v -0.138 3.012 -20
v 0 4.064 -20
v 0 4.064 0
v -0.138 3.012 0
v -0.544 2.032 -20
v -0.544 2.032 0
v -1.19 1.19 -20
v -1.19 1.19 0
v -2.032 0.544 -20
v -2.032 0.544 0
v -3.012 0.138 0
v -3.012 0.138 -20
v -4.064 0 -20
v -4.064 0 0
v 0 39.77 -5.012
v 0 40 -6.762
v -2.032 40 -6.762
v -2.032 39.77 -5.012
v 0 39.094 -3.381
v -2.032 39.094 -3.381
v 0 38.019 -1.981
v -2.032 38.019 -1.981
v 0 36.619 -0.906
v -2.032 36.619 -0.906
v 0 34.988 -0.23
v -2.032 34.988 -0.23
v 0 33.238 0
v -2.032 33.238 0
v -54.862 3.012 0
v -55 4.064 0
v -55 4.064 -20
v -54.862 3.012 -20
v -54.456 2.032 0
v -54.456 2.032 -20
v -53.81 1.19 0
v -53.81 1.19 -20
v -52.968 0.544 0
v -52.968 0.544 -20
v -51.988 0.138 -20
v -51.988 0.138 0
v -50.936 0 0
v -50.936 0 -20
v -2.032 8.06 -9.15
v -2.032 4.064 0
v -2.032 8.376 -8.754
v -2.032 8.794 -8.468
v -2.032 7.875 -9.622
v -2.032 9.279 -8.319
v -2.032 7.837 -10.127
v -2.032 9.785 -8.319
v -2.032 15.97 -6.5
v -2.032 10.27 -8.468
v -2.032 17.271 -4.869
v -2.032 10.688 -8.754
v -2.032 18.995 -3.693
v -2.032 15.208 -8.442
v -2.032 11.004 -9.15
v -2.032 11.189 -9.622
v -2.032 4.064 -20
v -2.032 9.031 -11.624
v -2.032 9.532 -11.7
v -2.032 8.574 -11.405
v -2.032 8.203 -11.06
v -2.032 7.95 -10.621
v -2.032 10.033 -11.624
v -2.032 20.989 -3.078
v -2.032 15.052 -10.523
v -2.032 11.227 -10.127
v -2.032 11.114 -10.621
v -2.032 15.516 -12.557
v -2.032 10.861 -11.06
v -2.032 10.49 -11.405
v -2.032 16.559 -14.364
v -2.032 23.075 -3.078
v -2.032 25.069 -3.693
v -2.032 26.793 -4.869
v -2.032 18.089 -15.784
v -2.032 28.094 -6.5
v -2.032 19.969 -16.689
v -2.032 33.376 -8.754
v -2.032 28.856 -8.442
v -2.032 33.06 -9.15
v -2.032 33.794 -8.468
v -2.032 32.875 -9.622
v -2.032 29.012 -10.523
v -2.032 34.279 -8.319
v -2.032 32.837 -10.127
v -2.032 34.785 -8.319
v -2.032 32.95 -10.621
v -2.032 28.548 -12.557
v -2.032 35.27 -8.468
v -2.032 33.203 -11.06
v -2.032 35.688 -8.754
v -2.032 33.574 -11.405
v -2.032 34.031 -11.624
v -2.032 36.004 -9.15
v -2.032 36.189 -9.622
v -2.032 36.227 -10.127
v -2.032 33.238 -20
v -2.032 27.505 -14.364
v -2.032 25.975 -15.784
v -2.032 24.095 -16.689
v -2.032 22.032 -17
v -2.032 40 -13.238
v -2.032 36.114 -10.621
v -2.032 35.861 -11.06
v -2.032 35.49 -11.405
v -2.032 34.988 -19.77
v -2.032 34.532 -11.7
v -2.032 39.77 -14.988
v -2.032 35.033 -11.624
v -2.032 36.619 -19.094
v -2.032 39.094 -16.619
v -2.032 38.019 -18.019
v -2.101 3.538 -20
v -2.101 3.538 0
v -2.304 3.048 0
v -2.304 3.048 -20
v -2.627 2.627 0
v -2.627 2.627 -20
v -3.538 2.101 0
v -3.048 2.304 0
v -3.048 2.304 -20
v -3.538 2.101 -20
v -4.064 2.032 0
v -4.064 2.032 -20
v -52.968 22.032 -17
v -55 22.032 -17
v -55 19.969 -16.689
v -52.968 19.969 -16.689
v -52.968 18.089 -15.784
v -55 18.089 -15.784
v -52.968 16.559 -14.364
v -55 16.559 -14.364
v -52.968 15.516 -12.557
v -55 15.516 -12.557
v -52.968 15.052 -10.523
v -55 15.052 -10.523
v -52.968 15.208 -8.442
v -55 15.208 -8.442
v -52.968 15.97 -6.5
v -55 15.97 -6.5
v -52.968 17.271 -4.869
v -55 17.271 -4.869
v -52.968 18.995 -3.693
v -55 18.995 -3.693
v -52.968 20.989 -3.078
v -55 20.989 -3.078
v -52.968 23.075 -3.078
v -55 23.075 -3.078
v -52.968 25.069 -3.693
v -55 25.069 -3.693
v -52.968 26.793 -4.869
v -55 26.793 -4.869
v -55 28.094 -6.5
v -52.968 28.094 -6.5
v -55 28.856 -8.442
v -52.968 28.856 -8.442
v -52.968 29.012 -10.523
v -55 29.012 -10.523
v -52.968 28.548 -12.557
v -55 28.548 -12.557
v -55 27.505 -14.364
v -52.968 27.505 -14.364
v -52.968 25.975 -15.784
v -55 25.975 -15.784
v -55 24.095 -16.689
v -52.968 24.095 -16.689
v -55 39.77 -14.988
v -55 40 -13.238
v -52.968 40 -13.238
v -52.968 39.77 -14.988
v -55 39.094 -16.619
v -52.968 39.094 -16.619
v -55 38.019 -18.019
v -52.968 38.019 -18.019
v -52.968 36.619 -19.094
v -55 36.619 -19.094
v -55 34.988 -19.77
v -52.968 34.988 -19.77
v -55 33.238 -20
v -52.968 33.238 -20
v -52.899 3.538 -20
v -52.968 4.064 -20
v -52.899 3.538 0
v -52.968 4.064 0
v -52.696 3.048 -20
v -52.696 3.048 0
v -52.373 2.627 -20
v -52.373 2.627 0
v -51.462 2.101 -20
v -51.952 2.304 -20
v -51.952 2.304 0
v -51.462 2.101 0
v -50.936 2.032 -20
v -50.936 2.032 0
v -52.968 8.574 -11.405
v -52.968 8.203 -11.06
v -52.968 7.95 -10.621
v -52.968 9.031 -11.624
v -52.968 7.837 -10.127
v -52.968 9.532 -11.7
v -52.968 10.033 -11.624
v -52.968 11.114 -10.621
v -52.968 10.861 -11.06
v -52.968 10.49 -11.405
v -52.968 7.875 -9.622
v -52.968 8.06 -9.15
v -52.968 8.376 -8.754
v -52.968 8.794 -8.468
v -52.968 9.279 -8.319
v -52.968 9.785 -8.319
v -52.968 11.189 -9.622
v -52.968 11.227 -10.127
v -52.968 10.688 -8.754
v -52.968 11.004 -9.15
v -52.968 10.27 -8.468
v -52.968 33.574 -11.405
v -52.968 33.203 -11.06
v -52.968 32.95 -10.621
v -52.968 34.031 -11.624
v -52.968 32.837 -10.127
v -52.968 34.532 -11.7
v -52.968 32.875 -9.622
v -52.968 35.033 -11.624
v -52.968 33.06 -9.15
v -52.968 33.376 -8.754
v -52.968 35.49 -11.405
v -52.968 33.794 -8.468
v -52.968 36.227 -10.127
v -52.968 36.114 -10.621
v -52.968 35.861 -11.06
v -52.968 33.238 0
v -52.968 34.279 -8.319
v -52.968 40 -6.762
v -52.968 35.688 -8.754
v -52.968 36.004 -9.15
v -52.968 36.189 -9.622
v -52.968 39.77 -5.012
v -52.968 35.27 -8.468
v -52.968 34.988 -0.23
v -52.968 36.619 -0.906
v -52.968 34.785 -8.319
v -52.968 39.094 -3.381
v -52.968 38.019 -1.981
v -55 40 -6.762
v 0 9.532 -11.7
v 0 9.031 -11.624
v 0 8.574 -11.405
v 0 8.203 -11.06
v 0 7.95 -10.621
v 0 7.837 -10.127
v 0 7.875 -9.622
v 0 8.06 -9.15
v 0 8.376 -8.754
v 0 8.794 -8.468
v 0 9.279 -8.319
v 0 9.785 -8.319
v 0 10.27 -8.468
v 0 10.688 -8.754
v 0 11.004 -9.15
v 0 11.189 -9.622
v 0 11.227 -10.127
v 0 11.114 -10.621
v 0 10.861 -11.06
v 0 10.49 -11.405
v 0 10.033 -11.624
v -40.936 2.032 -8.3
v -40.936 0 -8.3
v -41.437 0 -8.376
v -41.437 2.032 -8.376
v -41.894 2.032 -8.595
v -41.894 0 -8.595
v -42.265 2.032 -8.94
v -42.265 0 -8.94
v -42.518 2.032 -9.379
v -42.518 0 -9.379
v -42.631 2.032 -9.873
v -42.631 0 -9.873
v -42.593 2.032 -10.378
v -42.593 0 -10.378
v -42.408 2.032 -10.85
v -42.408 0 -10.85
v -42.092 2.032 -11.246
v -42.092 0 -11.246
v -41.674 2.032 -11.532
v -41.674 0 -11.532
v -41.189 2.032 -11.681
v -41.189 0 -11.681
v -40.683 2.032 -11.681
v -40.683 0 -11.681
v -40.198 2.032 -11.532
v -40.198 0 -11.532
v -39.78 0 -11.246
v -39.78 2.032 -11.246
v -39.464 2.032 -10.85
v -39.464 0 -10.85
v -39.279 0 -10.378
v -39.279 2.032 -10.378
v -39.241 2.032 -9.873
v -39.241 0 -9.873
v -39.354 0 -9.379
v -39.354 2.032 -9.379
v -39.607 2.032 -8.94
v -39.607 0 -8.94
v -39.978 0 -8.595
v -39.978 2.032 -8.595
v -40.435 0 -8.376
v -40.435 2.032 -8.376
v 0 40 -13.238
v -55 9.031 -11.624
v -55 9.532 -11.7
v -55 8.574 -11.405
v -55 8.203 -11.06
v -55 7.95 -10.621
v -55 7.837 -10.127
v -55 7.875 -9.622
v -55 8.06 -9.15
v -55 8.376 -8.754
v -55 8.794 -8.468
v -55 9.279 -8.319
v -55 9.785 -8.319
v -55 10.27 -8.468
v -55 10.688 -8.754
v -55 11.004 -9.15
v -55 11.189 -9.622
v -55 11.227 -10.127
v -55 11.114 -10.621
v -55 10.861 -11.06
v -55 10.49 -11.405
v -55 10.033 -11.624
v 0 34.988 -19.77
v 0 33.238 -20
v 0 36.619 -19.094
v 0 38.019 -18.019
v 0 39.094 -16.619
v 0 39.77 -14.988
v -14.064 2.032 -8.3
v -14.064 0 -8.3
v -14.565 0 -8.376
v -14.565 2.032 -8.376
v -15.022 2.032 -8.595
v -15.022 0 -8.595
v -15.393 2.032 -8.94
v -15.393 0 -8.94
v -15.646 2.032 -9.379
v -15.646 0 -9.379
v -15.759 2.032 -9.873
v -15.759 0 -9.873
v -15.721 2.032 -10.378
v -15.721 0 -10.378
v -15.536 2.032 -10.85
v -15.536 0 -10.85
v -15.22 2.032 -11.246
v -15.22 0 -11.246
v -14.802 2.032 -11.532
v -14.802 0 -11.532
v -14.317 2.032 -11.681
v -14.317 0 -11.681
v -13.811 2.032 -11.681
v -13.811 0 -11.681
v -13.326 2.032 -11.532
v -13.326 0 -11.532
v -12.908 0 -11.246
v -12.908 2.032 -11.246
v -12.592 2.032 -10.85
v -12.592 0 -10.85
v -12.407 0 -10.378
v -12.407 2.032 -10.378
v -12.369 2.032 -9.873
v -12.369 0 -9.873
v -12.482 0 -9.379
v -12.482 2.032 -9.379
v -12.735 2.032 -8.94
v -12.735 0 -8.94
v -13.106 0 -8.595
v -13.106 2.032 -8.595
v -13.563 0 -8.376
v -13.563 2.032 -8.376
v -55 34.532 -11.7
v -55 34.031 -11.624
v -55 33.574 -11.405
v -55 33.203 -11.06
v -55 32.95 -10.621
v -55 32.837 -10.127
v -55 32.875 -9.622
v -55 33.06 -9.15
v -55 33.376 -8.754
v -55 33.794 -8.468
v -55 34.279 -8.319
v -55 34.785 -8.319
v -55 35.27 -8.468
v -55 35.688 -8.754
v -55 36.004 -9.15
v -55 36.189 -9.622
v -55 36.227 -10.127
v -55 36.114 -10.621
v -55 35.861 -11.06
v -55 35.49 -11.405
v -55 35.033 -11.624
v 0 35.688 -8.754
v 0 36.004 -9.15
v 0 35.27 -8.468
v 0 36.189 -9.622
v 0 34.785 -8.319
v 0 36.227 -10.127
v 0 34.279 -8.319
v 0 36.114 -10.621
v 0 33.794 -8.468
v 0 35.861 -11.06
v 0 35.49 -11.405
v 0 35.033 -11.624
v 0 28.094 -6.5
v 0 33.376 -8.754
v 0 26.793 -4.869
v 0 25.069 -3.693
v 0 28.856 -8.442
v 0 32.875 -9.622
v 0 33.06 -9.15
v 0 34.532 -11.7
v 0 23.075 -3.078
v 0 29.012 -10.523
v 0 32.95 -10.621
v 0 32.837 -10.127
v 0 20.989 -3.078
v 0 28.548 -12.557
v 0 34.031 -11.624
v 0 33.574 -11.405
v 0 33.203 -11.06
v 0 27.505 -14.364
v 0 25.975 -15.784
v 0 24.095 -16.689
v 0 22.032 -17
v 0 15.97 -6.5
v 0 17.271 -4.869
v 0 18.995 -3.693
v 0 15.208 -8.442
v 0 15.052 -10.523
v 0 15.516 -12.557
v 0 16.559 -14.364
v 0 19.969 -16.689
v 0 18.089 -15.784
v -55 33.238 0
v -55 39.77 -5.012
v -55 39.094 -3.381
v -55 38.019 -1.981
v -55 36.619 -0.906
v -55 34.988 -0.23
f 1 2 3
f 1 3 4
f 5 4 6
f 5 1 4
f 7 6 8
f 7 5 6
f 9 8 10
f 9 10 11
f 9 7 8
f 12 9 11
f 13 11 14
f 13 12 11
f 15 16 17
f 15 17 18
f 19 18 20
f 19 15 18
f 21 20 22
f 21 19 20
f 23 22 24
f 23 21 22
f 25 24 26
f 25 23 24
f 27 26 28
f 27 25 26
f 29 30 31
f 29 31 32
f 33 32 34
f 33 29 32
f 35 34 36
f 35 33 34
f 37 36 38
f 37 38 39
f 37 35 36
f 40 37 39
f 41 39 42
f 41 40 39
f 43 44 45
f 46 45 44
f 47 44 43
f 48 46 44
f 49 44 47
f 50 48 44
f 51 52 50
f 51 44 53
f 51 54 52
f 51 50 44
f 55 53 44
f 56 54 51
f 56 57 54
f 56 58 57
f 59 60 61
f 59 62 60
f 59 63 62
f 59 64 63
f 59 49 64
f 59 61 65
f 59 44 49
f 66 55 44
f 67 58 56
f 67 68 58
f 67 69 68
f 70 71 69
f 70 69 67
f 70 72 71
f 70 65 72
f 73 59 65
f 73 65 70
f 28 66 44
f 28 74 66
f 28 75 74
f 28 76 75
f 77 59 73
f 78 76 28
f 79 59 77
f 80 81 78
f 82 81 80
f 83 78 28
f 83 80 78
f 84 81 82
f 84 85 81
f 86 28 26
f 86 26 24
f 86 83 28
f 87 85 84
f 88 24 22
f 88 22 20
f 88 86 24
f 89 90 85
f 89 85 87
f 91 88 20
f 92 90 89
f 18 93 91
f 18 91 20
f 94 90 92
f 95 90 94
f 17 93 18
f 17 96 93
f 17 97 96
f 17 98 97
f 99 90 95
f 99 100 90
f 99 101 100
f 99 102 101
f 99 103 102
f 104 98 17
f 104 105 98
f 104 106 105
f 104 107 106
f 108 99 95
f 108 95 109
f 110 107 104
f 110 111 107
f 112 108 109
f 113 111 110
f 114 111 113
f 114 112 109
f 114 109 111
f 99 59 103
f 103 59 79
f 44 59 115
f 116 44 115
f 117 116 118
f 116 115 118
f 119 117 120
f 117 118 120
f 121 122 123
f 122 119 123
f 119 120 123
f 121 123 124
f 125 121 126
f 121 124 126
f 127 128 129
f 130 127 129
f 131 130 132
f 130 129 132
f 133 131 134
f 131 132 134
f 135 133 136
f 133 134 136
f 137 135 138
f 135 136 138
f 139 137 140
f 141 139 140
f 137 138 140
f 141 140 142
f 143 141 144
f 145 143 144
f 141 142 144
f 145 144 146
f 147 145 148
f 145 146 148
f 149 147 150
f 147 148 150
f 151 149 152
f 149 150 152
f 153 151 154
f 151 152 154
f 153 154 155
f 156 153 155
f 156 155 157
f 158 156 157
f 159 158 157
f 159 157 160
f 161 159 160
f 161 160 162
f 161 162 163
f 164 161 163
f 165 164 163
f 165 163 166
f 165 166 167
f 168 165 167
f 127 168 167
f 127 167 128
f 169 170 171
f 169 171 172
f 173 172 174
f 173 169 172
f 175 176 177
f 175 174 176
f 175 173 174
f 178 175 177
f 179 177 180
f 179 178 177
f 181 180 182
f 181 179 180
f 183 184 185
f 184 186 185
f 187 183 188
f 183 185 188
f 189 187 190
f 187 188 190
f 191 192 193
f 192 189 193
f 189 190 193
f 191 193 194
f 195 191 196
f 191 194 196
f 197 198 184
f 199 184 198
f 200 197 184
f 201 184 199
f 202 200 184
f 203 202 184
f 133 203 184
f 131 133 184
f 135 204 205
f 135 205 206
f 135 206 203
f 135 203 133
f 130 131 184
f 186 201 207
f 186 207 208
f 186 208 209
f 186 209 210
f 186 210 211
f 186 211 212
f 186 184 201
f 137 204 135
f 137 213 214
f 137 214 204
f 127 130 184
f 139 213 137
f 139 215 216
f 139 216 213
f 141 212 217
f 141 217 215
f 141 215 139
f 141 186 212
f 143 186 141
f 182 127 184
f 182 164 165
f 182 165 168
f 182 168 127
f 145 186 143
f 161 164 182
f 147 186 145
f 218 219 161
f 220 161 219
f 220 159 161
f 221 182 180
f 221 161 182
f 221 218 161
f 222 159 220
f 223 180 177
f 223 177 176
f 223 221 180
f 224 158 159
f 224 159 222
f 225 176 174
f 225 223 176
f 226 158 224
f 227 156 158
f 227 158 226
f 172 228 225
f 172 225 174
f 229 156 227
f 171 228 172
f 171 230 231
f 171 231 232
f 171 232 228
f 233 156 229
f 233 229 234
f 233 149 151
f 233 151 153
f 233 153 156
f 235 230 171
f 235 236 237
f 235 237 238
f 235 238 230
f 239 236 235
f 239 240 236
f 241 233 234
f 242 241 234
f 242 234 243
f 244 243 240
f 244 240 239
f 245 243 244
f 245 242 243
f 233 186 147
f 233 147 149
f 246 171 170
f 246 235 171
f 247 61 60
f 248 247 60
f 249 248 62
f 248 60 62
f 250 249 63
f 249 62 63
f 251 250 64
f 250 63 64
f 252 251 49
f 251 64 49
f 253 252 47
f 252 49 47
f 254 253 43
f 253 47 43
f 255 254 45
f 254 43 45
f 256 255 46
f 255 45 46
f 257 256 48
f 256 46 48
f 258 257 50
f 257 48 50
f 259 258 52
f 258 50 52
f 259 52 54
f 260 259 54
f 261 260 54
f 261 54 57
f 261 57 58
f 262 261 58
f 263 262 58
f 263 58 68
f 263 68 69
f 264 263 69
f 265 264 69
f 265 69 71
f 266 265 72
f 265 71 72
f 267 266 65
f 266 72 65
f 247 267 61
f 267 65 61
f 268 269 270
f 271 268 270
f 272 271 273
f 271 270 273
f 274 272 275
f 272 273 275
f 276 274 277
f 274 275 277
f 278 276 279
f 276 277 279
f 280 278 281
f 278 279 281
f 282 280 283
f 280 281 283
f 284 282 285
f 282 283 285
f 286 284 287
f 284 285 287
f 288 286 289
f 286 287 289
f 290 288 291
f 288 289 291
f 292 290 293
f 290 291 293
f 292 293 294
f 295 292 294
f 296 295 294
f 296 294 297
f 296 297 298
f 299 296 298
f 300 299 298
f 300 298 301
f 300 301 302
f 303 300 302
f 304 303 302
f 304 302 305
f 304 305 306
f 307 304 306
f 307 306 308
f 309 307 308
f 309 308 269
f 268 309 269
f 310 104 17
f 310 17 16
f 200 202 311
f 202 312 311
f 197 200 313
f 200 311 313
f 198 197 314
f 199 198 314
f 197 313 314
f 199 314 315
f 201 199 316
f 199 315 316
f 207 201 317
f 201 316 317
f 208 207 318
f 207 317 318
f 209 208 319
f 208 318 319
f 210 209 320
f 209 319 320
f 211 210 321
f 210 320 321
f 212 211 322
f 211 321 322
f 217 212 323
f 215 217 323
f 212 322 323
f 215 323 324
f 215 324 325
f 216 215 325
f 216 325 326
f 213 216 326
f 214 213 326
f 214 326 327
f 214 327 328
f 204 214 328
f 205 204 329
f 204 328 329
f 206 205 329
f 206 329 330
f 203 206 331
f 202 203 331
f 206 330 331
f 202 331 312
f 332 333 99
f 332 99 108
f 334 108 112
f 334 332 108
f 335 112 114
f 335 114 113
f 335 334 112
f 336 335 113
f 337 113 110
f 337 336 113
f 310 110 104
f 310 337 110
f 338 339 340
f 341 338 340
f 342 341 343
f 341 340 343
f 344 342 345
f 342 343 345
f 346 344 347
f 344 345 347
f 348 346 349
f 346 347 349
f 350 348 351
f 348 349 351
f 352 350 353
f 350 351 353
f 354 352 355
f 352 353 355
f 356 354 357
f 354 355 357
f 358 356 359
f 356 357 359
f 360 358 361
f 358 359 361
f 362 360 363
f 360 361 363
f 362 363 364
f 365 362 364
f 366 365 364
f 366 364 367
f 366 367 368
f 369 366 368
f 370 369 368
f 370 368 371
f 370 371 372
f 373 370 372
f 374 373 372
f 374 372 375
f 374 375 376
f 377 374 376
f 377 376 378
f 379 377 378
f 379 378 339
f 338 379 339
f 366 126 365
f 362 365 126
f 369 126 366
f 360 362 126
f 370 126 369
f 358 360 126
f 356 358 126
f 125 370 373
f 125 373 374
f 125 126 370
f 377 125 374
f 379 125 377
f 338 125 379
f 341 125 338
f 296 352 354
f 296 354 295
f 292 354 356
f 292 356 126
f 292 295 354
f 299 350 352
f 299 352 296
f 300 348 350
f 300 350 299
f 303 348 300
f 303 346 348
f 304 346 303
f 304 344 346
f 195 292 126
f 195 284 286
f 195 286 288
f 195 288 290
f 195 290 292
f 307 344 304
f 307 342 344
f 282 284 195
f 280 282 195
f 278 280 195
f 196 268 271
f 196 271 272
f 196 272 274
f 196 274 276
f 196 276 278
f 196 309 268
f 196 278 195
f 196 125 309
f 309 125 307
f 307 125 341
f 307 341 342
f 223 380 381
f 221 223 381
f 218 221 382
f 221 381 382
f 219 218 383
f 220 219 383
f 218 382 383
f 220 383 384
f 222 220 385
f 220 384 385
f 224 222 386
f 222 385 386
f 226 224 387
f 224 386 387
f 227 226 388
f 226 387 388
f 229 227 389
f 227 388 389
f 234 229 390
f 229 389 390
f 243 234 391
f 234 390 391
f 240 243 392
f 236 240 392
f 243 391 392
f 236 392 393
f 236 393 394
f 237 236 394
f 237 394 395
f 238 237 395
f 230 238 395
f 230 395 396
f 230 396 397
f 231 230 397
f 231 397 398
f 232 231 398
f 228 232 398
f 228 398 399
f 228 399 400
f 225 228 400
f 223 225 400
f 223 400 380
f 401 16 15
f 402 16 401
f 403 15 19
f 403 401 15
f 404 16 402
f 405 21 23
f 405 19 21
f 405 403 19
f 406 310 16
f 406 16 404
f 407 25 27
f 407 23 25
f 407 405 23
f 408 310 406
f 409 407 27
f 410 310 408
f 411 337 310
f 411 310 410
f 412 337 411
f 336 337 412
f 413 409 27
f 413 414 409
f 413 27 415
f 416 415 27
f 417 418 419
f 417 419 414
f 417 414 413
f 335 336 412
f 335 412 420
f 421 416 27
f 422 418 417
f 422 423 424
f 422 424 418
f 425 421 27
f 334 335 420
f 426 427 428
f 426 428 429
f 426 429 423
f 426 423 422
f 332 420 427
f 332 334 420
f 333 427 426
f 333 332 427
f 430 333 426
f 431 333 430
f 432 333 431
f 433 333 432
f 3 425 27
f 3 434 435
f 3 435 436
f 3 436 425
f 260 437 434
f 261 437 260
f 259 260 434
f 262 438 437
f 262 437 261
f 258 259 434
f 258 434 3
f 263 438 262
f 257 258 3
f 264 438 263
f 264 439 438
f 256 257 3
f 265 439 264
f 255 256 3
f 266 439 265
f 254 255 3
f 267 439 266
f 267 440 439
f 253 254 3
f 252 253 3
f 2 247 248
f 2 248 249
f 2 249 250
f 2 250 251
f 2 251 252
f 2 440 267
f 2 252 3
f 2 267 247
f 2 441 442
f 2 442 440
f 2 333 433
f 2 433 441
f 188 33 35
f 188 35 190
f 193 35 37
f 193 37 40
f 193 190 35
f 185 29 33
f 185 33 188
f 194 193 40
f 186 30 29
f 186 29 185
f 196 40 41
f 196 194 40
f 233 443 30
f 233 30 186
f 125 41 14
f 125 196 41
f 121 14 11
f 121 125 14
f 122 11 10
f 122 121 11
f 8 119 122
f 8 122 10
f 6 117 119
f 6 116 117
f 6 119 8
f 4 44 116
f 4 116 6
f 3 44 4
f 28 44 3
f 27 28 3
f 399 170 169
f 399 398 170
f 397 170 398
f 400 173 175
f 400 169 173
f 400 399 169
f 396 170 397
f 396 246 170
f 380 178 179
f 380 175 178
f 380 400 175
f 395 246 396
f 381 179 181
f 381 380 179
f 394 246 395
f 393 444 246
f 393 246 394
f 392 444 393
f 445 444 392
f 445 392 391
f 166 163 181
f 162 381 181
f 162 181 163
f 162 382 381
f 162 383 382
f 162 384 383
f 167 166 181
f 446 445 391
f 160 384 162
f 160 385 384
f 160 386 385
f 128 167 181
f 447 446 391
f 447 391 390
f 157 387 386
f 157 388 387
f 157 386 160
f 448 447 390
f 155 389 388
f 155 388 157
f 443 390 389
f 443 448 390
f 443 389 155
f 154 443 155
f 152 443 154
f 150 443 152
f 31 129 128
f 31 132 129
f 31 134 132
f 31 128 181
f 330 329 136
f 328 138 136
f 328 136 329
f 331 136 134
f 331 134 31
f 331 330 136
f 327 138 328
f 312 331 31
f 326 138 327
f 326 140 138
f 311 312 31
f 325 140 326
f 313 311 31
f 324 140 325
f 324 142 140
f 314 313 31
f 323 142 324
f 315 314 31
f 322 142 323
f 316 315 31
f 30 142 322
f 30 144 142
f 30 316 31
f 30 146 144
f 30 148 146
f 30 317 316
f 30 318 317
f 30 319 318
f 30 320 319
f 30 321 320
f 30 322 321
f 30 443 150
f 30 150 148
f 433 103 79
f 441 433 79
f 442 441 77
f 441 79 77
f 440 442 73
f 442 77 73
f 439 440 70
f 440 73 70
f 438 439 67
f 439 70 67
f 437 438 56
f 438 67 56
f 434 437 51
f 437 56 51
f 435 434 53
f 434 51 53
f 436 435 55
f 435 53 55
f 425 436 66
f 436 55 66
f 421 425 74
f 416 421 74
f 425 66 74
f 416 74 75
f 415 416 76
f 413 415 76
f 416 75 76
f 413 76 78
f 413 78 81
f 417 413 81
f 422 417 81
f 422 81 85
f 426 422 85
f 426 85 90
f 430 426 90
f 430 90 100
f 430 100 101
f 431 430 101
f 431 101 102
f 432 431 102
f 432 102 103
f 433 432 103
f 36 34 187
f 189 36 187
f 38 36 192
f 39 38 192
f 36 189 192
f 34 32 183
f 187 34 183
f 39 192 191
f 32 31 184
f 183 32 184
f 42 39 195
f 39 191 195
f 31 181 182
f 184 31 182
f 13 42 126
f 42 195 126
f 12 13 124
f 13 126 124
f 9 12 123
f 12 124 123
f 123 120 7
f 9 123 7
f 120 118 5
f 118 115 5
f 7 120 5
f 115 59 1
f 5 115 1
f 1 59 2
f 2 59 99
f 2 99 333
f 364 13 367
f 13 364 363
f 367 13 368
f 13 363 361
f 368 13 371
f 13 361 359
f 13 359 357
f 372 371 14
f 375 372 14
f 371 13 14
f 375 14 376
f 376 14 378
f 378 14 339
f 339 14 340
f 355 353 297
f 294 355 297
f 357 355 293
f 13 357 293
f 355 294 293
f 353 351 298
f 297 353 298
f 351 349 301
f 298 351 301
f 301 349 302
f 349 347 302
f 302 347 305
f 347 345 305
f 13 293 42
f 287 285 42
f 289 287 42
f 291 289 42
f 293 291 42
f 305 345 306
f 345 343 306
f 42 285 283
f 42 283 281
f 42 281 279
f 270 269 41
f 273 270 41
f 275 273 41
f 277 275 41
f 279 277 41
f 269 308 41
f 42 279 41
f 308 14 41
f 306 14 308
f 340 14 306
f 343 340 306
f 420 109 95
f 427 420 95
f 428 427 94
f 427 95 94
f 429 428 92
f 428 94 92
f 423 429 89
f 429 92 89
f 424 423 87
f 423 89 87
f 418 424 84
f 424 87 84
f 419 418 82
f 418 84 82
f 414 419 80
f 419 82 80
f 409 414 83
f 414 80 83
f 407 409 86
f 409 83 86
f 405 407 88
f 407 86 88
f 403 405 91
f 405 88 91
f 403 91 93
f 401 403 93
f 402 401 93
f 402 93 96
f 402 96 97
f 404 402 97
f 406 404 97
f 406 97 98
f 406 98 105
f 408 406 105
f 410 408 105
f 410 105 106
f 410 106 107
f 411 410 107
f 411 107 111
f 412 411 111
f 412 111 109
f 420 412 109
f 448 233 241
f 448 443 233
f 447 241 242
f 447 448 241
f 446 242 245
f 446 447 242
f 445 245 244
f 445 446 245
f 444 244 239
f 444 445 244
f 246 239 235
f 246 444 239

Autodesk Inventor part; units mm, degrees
ref_plane "YZ Plane" through (0, 0, 0) normal (1, 0, 0) x (0, 1, 0)
ref_plane "XZ Plane" through (0, 0, 0) normal (0, 1, 0) x (-1, 0, 0)
ref_plane "XY Plane" through (0, 0, 0) normal (0, 0, 1) x (1, 0, 0)
sketch "Sketch3" plane through (0, 0, 0) normal (0, 1, 0) x (-1, 0, 0)
  line L0 (55, 0) -> (0, 0)
  line L1 (0, 0) -> (0, -20)
  line L2 (0, -20) -> (55, -20)
  line L3 (55, -20) -> (55, 0)
  dimension "d9" = 55
  dimension "d10" = 20
extrude "Plate1" add sketch "Sketch3" along normal blind 2.032
sketch "Sketch4" plane through (-52.968, 0, 0) normal (-1, 0, 0) x (0, -1, 0)
  line L0 (0, -20) -> (0, 0)
  line L1 (0, 0) -> (-40, 0)
  line L2 (-40, 0) -> (-40, -20)
  line L3 (-40, -20) -> (0, -20)
edge flange "Flange1" height 40 angle 90 thickness 2.032 bend radius 2.032 thickness toward (-1, 0, 0) relief tear relief width 2.032 relief depth 1.016 corner gap 2.032 corner form 0 edges at (-55, 2.032, -10) (0, 2.032, -10) wall of the first edge with corners at (-52.968, 0, -20) (-52.968, 0, 0) (-52.968, 40, 0) (-52.968, 40, -20)
bend "Bend1"
corner "Corner1"
sketch "Sketch5" plane through (0, 40, 0) normal (1, 0, 0) x (0, 0, -1)
  line L0 (0, -35.936) -> (20, -35.936) projected
  line L1 (0, -35.936) -> (20, -35.936) projected
  line L2 (20, 0) -> (20, -35.936) projected
  line L3 (0, 0) -> (20, 0) projected
  line L4 (0, -35.936) -> (0, 0) projected
  line L5 (20, -35.936) -> (20, 0) projected
  line L6 (20, -17.968) -> (0, -17.968) construction
  line L7 (0, -35.936) -> (0, 0) projected
  point P0 (0, -40)
  point P1 (10, -5.468)
  point P2 (10, -17.968)
  point P3 (10, -30.468)
  point P4 (10, -35.936)
  point P5 (10, -17.968)
  dimension "d22" = 12.5
  dimension "d23" = 12.5
hole "Hole1" at (0, 9.532, -10) at (0, 34.532, -10) direction (-1, 0, 0) diameter 3.4 depth 55 clearance for "Socket Head Cap Screw" size "M3" standard "Ansi Metric M Profile"
hole "Hole2" at (0, 22.032, -10) direction (-1, 0, 0) diameter 14 depth 55
fillet "Fillet1" radius 6.7625 4 edges at (-53.984, 40, 0) (-53.984, 40, -20) (-1.016, 40, -20) (-1.016, 40, 0)
sketch "Sketch6" plane through (0, 2.032, 0) normal (0, 1, 0) x (1, 0, 0)
  line L0 (-4.064, 0) -> (-4.064, 20) projected
  line L1 (-50.936, 20) -> (-4.064, 20) projected
  line L2 (-50.936, 20) -> (-50.936, 0) projected
  line L3 (-4.064, 0) -> (-50.936, 0) projected
  line L4 (-4.064, 0) -> (-4.064, 20) projected
  line L5 (-4.064, 10) -> (-14.064, 10) construction
  line L6 (-40.936, 10) -> (-50.936, 10) construction
  point P0 (0, 0)
  dimension "d39" = 10
hole "Hole3" at (-40.936, 2.032, -10) at (-14.064, 2.032, -10) direction (0, -1, 0) diameter 3.4 end through all clearance for "Socket Head Cap Screw" size "M3" standard "Ansi Metric M Profile"
equation "\"d29\" = Thickness"
equation "\"d11\" = Thickness"
equation "\"d12\" = BendReliefWidth"
equation "\"d13\" = BendReliefDepth"
equation "\"d14\" = MinimumRemnant"
equation "\"d15\" = TransitionRadius"
equation "\"d18\" = BendRadius"
equation "\"d19\" = CornerReliefSize"
equation "\"d20\" = GapSize"
equation "\"d21\" = JacobiRadiusSize"
equation "\"BendRadius\" = Thickness"
equation "\"BendReliefWidth\" = Thickness"
equation "\"BendReliefDepth\" = 0.5 * Thickness"
equation "\"CornerReliefSize\" = 4 * Thickness"
equation "\"MinimumRemnant\" = 2 * Thickness"
equation "\"TransitionRadius\" = BendRadius"
equation "\"JacobiRadiusSize\" = BendRadius"
equation "\"GapSize\" = Thickness"
equation "\"Thickness\" = 2.032"
properties part number "Flat Pattern"
